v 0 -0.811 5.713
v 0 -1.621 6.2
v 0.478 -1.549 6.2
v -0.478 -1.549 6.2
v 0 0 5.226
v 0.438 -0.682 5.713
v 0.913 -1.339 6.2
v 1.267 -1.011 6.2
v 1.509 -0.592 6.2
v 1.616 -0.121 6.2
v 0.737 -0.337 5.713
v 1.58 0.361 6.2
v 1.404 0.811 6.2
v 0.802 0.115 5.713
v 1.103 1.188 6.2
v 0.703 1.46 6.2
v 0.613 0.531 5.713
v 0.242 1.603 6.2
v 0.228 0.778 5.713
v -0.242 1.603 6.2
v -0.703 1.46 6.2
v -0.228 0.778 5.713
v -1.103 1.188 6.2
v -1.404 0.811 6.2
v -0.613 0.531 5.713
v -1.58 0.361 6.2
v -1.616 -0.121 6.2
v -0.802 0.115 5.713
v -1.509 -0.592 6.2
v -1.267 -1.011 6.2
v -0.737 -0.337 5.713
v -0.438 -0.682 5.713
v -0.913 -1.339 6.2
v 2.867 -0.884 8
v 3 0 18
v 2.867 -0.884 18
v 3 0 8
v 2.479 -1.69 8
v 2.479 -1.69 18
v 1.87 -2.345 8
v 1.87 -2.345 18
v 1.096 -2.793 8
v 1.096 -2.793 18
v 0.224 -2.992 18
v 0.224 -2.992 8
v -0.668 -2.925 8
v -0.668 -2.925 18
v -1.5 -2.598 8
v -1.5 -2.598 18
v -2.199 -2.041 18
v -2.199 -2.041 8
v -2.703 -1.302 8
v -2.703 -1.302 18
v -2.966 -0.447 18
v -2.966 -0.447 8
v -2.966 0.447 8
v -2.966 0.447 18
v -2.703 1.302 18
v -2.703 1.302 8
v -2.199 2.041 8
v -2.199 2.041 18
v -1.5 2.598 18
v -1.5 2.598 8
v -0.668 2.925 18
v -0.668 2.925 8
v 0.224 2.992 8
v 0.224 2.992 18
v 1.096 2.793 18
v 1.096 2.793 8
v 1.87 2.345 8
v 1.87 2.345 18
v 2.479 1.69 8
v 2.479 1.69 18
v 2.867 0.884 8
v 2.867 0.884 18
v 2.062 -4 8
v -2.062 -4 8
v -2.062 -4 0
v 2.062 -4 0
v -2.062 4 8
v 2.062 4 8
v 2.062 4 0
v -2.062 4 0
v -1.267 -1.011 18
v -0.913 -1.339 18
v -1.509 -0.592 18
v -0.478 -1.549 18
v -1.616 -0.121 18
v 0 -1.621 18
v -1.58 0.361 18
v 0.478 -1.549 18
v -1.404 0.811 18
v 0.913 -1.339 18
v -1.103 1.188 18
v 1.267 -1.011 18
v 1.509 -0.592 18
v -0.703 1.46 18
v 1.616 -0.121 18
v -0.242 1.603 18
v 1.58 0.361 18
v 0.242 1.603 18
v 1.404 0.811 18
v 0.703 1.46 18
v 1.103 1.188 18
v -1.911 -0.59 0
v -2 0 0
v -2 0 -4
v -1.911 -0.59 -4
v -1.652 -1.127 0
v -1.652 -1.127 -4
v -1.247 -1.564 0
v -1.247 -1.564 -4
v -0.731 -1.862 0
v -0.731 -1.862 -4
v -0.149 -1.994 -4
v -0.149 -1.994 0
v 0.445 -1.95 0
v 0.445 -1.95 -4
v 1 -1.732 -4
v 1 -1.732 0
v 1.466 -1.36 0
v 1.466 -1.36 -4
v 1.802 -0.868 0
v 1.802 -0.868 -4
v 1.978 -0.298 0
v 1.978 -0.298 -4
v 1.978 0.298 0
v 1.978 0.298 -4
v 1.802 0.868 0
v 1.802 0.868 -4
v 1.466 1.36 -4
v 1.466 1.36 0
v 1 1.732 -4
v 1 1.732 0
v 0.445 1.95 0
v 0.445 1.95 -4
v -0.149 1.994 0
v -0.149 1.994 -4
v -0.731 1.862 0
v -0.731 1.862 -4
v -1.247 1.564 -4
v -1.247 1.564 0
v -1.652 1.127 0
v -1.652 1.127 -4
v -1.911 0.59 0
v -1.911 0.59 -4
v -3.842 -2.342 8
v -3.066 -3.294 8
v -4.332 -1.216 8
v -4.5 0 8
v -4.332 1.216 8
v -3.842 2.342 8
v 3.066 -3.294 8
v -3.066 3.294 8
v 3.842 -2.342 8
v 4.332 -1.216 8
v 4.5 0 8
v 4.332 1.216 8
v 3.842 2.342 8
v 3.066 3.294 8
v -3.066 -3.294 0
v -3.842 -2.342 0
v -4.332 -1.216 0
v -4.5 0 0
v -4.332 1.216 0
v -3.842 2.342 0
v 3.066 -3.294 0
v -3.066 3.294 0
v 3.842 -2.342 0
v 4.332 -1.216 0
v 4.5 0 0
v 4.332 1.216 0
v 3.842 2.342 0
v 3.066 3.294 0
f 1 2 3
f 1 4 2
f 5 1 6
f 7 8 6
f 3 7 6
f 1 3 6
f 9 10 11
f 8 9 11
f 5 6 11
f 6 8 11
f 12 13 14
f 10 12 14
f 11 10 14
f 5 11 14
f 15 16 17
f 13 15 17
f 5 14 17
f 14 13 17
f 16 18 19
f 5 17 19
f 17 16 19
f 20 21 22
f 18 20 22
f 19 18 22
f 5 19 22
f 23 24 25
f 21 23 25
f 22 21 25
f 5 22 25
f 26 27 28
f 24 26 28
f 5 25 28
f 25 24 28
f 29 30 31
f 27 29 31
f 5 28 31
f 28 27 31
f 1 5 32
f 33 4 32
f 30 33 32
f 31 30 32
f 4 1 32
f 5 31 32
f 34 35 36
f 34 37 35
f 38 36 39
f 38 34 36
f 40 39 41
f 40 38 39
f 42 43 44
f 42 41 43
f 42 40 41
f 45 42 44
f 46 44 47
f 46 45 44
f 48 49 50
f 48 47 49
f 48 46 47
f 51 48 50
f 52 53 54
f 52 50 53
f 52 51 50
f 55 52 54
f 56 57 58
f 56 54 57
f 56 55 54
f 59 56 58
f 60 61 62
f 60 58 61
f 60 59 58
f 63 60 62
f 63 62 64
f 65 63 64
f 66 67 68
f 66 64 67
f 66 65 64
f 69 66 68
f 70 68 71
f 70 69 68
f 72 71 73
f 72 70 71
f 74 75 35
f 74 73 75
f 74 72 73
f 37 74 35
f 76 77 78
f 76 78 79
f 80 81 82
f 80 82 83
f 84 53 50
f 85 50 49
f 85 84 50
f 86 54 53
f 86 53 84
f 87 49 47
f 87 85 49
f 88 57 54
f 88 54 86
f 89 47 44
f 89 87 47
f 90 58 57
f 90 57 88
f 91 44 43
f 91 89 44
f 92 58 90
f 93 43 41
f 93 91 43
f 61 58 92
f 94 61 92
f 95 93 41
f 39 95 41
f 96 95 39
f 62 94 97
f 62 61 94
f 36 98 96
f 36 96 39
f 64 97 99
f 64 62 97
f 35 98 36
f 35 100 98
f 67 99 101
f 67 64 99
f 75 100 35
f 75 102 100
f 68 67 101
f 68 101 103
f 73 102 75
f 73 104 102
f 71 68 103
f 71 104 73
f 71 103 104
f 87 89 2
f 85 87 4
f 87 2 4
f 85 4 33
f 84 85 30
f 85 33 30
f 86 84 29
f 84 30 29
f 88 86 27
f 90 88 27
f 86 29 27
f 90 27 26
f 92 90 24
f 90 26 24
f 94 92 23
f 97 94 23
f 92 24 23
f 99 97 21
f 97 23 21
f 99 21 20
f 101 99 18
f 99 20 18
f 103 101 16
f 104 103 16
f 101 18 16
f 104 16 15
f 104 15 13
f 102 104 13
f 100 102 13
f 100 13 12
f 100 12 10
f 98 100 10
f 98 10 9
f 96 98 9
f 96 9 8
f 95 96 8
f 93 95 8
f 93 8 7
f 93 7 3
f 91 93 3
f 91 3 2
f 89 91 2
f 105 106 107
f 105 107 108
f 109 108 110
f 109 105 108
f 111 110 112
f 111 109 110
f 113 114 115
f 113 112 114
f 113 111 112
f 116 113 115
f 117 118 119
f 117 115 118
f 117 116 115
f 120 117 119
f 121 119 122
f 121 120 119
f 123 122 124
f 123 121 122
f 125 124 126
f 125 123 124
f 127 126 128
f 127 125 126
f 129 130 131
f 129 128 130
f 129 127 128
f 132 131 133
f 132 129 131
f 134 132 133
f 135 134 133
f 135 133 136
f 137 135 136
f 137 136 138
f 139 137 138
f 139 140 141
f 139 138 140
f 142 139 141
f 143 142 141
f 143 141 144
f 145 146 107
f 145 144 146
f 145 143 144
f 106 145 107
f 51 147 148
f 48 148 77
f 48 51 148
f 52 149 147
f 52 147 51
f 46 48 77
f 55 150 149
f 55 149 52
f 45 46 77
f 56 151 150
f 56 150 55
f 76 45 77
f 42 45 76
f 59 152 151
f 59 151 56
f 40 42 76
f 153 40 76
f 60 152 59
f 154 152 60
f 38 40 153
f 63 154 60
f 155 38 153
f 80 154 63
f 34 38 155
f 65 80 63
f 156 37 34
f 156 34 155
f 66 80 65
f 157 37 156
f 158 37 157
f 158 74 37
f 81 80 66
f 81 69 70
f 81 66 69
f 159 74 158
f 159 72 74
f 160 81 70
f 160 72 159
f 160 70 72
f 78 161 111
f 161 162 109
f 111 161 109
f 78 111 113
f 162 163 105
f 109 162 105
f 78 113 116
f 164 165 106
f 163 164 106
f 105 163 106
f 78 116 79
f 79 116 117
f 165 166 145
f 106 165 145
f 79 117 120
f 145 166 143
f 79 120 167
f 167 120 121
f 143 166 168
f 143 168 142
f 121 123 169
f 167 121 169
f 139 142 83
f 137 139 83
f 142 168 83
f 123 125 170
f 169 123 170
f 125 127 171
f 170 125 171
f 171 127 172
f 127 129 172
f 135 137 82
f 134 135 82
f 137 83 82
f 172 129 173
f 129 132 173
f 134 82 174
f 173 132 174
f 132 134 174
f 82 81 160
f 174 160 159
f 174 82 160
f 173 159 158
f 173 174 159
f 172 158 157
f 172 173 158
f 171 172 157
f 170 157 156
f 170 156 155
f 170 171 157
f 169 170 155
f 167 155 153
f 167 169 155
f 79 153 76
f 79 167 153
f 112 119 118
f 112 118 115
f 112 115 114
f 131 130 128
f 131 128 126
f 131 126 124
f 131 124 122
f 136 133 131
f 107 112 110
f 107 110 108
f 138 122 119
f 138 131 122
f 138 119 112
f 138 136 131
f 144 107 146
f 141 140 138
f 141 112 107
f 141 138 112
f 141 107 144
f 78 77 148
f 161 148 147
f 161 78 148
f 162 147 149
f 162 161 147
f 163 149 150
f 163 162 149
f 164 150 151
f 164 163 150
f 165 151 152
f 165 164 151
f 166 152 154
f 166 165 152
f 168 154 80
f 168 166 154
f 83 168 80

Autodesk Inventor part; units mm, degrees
ref_plane "YZ Plane" through (0, 0, 0) normal (1, 0, 0) x (0, 1, 0)
ref_plane "XZ Plane" through (0, 0, 0) normal (0, 1, 0) x (-1, 0, 0)
ref_plane "XY Plane" through (0, 0, 0) normal (0, 0, 1) x (1, 0, 0)
sketch "Skizze1" plane through (0, 0, 0) normal (0, 0, 1) x (1, 0, 0)
  line L0 (-6.3, 0) -> (6.3, 0) projected
  line L1 (0, -6.3) -> (0, 6.3) projected
  circle A0 centre (0, 0) radius 4.5
  dimension "d0" = 9
extrude "Extrusion1" add sketch "Skizze1" along normal blind 8
sketch "Skizze2" plane through (0, 0, 0) normal (0, 0, -1) x (-1, 0, 0)
  circle A0 centre (0, 0) radius 4.5 projected
  circle A1 centre (0, 0) radius 2
  dimension "d3" = 4
extrude "Extrusion2" add sketch "Skizze2" along normal blind 4 contours A1
thread "Gewinde1" size "M4x0.7" class "6g" standard "ANSI Metric M Profile" full length
sketch "Skizze3" plane through (0, 0, 8) normal (0, 0, 1) x (1, 0, 0)
  circle A0 centre (0, 0) radius 3
  dimension "d8" = 6
extrude "Extrusion3" add sketch "Skizze3" along normal blind 10
sketch "Skizze4" plane through (0, 0, 8) normal (0, 0, 1) x (1, 0, 0)
  circle A0 centre (0, 0) radius 3 projected
  circle A1 centre (0, 0) radius 4.5 projected
  line L0 (-16.8, 0) -> (16.8, 0) projected
  line L1 (0, -6.3) -> (0, 6.3) projected
  line L2 (12, 4) -> (-12, 4)
  line L3 (-12, 4) -> (-12, -4)
  line L4 (-12, -4) -> (12, -4)
  line L5 (12, -4) -> (12, 4)
  line L6 (12, 4) -> (-12, -4) construction
  line L7 (-12, 4) -> (12, -4) construction
  point P0 (-2.0616, 4)
  point P1 (2.0616, 4)
  point P2 (-2.0616, -4)
  point P3 (2.0616, -4)
  dimension "d11" = 8
extrude "Extrusion4" cut sketch "Skizze4" against normal blind 10 contours L2 A1 L1 | L1 A1 L2 | L4 A1 L1 | L1 A1 L4
sketch "Skizze5" plane through (0, 0, 18) normal (0, 0, 1) x (1, 0, 0)
  circle A0 centre (0, 0) radius 2 projected
hole "Bohrung1" at (0, 0, 18) direction (0, 0, -1) diameter 3.242 depth 11.8 tip angle 118 thread size "M4x0.7" class "6H" standard "ISO Metric profile"
properties part number "24_0497_0022"
